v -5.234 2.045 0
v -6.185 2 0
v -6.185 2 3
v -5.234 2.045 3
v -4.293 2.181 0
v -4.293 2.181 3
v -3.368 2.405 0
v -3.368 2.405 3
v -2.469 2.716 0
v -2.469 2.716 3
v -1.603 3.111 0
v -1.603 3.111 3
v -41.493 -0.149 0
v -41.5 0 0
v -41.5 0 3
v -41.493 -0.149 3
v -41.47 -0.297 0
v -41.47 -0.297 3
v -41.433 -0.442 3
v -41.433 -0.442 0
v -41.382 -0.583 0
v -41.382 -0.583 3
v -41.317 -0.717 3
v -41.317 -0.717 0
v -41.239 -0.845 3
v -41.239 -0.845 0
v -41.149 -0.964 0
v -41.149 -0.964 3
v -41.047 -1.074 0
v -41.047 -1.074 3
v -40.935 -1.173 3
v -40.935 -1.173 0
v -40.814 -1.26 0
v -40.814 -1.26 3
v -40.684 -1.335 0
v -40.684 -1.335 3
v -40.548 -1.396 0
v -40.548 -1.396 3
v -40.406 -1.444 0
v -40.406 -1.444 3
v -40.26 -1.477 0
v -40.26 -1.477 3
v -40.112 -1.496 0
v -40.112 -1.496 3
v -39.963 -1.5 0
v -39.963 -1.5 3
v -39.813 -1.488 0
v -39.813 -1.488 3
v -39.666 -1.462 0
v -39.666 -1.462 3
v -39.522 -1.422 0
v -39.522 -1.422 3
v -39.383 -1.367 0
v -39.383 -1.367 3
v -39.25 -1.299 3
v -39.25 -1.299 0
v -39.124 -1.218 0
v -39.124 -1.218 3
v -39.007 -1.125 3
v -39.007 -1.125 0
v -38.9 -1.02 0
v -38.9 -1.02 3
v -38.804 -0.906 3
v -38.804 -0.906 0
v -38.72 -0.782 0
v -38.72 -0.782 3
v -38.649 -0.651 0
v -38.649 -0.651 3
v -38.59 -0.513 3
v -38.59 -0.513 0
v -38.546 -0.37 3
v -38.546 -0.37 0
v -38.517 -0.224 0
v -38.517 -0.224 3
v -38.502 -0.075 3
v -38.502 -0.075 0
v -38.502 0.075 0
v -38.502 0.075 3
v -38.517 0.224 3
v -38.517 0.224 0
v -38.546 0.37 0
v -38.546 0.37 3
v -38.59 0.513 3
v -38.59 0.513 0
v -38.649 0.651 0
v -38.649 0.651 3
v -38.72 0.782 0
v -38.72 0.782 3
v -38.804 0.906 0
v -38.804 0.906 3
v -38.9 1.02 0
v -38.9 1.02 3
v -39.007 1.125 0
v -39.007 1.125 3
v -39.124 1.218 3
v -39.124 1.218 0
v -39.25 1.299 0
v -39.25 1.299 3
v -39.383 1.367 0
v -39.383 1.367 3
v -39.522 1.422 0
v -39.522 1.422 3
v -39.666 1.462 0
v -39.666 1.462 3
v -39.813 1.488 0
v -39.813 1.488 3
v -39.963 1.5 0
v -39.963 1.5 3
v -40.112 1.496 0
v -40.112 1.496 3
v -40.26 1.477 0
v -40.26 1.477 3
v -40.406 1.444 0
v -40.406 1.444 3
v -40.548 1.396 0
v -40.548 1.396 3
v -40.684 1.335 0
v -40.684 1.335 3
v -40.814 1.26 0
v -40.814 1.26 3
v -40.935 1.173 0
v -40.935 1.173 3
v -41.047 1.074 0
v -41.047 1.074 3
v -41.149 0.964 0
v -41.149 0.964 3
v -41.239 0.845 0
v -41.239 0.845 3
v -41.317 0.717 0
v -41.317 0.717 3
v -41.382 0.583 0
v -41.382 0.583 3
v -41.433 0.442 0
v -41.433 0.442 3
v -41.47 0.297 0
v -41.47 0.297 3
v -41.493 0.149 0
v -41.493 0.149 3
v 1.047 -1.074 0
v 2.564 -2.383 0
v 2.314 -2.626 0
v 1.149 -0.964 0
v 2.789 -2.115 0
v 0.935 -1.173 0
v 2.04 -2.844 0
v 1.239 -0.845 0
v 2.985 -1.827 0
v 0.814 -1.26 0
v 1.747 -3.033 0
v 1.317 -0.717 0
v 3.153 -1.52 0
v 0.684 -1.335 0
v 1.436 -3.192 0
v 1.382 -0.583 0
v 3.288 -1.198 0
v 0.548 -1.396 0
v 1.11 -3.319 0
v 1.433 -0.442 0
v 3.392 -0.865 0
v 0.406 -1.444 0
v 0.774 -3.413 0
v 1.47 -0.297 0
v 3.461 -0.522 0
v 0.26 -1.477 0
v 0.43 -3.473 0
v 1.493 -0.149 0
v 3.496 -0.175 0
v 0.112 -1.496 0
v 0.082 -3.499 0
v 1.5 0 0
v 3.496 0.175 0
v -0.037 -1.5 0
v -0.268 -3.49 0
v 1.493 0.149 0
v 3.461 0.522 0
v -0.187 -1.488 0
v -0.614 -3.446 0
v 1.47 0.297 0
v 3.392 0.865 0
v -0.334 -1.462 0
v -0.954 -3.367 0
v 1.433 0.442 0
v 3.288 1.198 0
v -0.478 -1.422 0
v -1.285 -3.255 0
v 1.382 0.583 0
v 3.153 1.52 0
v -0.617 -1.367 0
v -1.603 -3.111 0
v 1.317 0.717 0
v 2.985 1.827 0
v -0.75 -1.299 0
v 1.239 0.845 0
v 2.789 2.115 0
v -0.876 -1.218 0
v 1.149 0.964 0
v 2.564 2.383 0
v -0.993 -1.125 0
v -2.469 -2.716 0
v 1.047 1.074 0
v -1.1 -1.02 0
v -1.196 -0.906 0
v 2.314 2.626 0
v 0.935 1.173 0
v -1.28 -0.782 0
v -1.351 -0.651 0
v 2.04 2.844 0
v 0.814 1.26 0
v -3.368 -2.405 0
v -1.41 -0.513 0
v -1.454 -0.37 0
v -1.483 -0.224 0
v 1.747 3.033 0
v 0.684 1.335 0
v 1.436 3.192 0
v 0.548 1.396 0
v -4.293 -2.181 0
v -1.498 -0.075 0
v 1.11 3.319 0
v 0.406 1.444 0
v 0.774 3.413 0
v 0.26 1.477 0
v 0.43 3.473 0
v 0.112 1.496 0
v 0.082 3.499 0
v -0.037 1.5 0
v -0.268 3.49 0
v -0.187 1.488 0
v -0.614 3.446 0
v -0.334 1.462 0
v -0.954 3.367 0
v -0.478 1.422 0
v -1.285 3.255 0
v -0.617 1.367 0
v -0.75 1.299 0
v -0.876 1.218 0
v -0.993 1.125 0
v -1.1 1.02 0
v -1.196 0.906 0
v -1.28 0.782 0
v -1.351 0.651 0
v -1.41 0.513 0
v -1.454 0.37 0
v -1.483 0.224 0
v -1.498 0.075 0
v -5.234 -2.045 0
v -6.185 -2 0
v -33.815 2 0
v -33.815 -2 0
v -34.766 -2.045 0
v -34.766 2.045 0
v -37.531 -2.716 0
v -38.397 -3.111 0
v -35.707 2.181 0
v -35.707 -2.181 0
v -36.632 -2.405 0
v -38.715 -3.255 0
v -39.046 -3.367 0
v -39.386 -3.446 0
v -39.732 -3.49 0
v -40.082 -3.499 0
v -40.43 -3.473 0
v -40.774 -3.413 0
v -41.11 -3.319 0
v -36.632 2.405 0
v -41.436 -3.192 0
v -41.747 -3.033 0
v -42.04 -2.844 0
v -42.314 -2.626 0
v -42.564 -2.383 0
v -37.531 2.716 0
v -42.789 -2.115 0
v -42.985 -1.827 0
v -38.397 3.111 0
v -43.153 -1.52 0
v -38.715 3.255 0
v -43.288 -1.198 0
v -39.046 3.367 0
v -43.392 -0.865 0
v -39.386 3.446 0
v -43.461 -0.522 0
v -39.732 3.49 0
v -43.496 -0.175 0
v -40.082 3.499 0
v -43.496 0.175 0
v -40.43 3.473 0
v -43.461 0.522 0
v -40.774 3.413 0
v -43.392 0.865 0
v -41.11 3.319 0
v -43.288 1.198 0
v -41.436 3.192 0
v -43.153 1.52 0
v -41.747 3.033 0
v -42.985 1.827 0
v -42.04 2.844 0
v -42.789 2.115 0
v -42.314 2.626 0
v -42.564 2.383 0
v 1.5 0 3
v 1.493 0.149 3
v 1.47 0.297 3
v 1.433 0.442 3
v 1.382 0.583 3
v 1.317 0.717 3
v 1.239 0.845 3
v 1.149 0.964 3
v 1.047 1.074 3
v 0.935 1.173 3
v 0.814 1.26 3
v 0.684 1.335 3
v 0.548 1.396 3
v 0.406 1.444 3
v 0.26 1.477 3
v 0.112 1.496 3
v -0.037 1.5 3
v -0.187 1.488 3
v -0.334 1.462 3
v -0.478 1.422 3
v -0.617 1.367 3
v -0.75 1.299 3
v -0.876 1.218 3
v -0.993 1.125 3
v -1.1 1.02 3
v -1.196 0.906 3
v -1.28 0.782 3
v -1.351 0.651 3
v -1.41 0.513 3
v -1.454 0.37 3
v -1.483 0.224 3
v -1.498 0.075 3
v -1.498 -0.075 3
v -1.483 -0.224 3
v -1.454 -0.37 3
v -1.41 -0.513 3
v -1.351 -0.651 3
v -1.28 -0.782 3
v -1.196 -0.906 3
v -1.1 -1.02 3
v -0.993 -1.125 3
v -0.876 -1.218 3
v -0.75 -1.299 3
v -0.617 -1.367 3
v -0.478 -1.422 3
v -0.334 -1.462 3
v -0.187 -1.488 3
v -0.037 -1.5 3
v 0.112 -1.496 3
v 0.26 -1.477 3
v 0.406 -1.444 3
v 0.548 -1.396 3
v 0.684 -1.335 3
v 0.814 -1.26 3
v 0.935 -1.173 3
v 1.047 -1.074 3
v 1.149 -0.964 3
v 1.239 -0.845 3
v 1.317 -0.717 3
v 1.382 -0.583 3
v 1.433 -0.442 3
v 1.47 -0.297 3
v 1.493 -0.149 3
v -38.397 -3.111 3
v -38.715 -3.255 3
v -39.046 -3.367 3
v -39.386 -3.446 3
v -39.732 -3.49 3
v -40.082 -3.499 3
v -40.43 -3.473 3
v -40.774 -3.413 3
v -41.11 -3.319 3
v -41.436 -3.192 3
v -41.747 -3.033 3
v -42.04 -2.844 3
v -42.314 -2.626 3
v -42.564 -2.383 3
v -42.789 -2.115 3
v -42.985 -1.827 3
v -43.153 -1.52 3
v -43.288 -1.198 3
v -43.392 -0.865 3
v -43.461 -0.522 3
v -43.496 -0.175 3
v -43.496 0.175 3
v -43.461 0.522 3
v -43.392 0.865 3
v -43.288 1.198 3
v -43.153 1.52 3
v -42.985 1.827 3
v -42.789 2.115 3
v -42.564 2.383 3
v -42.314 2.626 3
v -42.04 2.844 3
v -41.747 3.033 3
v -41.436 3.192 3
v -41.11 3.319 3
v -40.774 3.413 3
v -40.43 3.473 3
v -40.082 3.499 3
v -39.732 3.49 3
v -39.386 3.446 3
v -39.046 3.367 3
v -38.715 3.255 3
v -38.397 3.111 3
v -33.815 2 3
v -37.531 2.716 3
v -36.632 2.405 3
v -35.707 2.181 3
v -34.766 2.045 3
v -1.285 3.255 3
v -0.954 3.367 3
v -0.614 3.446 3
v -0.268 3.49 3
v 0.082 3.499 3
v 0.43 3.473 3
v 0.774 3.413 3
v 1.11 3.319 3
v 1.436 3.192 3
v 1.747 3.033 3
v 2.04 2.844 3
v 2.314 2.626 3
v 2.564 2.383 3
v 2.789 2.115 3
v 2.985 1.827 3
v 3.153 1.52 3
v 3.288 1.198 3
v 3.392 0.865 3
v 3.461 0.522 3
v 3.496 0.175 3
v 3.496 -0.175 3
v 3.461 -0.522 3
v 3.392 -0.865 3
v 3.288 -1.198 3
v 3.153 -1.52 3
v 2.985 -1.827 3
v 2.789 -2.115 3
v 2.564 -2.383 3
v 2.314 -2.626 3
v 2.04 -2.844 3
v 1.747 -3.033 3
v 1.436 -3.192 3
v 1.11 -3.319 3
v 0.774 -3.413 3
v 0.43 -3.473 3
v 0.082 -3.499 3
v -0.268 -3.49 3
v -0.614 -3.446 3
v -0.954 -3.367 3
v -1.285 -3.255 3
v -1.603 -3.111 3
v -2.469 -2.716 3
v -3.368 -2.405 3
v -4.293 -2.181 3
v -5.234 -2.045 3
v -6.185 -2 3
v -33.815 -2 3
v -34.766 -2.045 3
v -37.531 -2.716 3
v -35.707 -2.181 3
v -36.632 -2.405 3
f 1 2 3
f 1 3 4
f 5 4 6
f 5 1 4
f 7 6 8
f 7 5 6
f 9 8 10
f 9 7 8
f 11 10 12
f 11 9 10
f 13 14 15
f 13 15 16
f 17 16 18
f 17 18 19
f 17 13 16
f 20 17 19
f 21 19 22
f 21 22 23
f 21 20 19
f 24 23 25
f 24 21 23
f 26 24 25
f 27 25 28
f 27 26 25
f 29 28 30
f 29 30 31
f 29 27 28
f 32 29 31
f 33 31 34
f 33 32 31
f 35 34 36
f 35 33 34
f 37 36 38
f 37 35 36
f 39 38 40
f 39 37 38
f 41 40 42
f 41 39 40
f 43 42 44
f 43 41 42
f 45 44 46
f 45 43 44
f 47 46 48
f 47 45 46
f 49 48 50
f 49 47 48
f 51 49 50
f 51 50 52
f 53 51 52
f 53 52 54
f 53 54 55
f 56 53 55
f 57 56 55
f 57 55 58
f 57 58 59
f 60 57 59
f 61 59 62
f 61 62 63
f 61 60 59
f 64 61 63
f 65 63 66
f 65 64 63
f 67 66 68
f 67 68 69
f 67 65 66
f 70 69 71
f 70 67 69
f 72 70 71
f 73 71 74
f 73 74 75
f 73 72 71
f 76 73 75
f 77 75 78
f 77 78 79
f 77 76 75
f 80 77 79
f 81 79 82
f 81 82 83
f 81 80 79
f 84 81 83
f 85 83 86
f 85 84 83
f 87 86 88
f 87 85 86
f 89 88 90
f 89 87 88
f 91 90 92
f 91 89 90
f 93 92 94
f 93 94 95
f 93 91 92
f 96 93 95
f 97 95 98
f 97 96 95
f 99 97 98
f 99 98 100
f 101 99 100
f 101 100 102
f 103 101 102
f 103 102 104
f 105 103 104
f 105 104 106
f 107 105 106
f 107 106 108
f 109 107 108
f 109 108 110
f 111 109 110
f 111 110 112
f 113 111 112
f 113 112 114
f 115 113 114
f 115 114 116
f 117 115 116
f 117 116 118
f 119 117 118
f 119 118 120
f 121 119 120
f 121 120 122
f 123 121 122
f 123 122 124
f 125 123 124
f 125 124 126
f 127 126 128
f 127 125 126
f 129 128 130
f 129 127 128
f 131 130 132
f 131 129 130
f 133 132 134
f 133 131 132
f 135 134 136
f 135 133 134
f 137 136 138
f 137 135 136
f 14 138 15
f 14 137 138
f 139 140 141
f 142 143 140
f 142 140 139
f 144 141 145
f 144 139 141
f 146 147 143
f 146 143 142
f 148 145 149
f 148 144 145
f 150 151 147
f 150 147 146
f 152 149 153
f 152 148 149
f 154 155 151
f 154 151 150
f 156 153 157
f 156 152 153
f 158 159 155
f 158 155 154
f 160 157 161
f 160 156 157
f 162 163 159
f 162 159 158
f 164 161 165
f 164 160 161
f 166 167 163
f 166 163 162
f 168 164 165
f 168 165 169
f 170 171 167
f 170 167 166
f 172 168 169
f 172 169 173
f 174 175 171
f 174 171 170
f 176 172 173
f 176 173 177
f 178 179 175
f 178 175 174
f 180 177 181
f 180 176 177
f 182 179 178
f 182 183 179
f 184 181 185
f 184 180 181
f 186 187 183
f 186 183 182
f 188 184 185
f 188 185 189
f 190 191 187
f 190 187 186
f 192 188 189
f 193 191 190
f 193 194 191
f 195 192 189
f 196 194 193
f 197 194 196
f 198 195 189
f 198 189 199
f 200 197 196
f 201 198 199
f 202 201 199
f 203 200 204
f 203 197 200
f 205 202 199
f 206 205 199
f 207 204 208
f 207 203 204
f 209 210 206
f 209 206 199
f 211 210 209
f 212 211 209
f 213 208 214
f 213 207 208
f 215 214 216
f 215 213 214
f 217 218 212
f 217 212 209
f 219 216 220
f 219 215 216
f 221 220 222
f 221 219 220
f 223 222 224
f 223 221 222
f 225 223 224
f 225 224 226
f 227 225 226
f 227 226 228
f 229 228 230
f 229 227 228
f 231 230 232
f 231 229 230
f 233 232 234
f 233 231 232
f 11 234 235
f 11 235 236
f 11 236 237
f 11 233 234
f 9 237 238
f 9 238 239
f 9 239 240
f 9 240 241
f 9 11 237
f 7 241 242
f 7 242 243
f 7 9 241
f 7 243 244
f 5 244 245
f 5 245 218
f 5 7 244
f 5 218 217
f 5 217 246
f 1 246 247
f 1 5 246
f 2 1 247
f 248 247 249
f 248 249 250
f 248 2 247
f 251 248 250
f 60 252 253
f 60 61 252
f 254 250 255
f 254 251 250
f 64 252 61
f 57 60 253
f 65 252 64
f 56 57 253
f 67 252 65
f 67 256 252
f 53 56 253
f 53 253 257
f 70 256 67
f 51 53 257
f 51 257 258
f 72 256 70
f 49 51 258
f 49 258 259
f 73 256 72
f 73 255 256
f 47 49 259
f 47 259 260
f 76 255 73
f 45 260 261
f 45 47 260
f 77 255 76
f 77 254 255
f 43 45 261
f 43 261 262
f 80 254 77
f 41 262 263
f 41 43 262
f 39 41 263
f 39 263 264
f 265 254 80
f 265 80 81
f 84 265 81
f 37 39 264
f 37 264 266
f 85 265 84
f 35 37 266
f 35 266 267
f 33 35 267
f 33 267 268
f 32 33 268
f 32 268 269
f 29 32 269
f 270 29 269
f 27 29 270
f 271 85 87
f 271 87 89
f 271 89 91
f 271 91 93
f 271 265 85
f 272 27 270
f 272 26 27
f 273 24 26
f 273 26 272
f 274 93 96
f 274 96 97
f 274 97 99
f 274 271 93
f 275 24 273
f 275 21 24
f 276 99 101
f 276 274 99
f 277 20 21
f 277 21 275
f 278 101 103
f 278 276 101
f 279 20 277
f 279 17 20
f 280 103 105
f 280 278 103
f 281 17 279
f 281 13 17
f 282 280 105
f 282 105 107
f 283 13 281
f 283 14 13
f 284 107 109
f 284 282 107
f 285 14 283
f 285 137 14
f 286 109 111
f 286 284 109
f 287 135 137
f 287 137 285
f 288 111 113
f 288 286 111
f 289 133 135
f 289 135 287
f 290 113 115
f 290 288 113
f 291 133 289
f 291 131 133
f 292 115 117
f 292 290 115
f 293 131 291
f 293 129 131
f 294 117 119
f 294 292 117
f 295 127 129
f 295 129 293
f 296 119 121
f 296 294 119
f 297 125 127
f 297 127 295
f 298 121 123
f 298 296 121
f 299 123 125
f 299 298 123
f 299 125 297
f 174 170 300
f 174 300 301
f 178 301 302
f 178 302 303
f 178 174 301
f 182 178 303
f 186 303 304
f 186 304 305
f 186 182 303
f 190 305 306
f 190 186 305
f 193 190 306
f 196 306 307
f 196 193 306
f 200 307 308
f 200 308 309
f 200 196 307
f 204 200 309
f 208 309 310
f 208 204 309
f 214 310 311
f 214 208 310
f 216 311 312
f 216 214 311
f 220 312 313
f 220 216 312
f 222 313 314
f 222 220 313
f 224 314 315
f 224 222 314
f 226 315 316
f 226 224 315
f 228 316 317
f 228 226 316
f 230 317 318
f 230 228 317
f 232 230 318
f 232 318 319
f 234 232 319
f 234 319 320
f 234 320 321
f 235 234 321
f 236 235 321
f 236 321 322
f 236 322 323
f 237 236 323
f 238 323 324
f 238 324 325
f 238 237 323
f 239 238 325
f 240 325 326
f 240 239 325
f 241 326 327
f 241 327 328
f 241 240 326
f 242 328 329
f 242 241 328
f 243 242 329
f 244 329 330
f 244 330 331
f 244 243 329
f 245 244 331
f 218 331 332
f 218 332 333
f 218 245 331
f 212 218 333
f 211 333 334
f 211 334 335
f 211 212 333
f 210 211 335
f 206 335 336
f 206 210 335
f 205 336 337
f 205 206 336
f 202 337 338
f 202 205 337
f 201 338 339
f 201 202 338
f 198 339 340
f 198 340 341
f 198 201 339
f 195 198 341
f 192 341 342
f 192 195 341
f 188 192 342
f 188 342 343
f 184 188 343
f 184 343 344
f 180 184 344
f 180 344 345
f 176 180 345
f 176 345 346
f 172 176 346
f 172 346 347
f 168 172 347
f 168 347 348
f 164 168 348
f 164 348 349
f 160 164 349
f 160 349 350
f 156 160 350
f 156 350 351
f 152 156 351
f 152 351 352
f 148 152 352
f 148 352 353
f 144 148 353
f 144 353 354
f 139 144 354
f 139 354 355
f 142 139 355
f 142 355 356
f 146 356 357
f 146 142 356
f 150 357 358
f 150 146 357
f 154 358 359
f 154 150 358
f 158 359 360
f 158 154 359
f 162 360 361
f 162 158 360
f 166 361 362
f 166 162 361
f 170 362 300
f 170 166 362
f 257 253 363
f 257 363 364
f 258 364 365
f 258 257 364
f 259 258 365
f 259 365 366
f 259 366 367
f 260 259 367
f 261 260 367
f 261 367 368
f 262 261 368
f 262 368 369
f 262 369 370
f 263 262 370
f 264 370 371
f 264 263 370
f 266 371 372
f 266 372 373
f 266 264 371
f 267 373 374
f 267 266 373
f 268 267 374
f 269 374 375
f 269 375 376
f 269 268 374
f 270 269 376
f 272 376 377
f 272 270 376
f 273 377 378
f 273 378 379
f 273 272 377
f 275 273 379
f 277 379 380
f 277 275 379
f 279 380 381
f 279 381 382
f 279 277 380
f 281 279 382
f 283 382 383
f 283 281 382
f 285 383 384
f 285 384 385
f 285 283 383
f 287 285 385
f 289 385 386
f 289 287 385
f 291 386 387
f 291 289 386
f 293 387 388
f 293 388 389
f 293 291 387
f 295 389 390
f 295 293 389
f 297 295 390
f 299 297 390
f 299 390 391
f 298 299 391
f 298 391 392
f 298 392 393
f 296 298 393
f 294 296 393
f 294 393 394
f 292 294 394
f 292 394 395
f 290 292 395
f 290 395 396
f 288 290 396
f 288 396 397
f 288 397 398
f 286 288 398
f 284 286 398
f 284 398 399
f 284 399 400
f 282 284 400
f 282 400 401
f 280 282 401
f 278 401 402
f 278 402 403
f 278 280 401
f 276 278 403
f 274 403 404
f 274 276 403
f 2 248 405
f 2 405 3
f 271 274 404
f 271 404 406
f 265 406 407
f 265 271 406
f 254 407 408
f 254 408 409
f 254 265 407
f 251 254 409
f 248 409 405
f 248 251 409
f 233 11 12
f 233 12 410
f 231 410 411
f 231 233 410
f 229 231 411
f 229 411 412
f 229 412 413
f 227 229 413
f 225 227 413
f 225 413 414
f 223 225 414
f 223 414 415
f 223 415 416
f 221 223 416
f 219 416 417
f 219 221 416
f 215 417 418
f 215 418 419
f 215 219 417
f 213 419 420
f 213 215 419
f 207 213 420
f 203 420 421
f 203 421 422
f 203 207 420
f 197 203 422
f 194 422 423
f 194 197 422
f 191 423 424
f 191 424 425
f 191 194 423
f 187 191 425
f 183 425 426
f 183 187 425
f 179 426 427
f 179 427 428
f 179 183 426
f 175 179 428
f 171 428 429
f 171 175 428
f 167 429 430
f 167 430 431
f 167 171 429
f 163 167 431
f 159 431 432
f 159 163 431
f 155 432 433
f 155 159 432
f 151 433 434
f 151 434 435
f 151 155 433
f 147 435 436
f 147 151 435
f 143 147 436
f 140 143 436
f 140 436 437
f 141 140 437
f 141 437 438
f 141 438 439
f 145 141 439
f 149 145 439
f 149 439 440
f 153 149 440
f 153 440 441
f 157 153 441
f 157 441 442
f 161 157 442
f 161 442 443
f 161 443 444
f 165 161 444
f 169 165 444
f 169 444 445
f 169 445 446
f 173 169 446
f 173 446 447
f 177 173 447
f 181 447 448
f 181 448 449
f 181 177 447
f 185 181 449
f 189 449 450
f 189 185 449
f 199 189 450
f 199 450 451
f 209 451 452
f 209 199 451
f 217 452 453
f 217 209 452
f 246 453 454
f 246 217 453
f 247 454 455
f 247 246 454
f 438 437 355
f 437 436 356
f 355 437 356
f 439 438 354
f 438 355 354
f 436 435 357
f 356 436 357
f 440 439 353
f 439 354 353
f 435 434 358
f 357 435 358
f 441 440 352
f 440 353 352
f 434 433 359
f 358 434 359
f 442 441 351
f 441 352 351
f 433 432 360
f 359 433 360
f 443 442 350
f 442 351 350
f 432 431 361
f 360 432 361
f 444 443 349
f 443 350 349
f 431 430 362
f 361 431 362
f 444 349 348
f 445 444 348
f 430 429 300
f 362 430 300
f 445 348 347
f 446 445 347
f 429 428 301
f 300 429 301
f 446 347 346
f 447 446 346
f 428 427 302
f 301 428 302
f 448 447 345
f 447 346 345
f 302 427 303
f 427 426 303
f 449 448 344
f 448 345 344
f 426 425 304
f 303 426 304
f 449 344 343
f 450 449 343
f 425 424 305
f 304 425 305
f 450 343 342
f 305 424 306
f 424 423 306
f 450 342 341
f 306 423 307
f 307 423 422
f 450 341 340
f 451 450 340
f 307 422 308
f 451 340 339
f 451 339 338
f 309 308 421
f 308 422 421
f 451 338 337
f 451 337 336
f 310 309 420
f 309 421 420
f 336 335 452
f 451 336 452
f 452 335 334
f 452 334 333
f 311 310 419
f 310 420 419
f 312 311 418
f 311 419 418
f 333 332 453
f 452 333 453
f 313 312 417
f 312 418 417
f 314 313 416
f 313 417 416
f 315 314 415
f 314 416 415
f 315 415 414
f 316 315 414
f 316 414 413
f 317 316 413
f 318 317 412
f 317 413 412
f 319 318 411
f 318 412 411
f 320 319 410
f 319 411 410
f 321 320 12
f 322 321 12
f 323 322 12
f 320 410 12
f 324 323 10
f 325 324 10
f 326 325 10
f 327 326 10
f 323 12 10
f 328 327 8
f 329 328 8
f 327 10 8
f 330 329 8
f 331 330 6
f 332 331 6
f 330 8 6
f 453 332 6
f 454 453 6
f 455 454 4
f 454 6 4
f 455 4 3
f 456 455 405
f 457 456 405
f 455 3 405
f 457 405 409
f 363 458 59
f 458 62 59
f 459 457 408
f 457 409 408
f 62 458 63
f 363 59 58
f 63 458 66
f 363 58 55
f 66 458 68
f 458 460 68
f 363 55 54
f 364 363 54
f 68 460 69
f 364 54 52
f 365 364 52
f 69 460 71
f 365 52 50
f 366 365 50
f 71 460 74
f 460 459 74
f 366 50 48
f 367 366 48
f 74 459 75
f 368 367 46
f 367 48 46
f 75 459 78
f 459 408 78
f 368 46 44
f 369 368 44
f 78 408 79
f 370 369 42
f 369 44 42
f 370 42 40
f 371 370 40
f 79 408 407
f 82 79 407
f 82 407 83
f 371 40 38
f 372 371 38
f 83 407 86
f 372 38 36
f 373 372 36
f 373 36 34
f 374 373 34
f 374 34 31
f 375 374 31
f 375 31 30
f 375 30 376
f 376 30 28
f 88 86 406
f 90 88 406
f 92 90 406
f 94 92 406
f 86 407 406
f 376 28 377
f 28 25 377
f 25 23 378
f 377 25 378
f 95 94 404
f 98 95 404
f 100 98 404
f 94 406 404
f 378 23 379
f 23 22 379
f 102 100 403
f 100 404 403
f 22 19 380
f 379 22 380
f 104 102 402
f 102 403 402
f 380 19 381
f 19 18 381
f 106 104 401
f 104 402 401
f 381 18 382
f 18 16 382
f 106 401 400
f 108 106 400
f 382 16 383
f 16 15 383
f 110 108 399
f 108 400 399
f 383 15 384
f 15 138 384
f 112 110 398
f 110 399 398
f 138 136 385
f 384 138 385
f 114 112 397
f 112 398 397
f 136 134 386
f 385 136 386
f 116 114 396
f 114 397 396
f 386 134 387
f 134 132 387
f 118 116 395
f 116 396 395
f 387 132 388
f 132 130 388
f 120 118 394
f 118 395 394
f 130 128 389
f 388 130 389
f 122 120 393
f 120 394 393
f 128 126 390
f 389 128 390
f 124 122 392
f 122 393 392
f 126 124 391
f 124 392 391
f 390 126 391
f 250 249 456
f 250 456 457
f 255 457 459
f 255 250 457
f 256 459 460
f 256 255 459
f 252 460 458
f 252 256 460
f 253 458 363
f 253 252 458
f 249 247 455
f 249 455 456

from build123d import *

# Parameters (mm, degrees)
SKETCH1_R           = 1.5
BOSS_EXTRUDE1_DEPTH = 3


with BuildPart() as part:
    # Sketch1 → Boss-Extrude1 (new body)
    with BuildSketch(Plane.XY):
        with BuildLine():
            Line((-33.815341562, 2), (-6.184658438, 2))
            ThreePointArc((-6.184658438, 2), (-3.827635834, 2.281746842), (-1.603429966, 3.111111111))
            ThreePointArc((-1.603429966, 3.111111111), (3.5, 0), (-1.603429966, -3.111111111))
            ThreePointArc((-1.603429966, -3.111111111), (-3.827635834, -2.281746842), (-6.184658438, -2))
            Line((-6.184658438, -2), (-33.815341562, -2))
            ThreePointArc((-33.815341562, -2), (-36.172364166, -2.281746842), (-38.396570034, -3.111111111))
            ThreePointArc((-38.396570034, -3.111111111), (-43.5, 0), (-38.396570034, 3.111111111))
            ThreePointArc((-38.396570034, 3.111111111), (-36.172364166, 2.281746842), (-33.815341562, 2))
        make_face()
        Circle(SKETCH1_R, mode=Mode.SUBTRACT)
        with Locations(Location((-40, 0, 0), (0, 0, 180))):
            Circle(SKETCH1_R, mode=Mode.SUBTRACT)
    extrude(amount=BOSS_EXTRUDE1_DEPTH)


solid = part.part
